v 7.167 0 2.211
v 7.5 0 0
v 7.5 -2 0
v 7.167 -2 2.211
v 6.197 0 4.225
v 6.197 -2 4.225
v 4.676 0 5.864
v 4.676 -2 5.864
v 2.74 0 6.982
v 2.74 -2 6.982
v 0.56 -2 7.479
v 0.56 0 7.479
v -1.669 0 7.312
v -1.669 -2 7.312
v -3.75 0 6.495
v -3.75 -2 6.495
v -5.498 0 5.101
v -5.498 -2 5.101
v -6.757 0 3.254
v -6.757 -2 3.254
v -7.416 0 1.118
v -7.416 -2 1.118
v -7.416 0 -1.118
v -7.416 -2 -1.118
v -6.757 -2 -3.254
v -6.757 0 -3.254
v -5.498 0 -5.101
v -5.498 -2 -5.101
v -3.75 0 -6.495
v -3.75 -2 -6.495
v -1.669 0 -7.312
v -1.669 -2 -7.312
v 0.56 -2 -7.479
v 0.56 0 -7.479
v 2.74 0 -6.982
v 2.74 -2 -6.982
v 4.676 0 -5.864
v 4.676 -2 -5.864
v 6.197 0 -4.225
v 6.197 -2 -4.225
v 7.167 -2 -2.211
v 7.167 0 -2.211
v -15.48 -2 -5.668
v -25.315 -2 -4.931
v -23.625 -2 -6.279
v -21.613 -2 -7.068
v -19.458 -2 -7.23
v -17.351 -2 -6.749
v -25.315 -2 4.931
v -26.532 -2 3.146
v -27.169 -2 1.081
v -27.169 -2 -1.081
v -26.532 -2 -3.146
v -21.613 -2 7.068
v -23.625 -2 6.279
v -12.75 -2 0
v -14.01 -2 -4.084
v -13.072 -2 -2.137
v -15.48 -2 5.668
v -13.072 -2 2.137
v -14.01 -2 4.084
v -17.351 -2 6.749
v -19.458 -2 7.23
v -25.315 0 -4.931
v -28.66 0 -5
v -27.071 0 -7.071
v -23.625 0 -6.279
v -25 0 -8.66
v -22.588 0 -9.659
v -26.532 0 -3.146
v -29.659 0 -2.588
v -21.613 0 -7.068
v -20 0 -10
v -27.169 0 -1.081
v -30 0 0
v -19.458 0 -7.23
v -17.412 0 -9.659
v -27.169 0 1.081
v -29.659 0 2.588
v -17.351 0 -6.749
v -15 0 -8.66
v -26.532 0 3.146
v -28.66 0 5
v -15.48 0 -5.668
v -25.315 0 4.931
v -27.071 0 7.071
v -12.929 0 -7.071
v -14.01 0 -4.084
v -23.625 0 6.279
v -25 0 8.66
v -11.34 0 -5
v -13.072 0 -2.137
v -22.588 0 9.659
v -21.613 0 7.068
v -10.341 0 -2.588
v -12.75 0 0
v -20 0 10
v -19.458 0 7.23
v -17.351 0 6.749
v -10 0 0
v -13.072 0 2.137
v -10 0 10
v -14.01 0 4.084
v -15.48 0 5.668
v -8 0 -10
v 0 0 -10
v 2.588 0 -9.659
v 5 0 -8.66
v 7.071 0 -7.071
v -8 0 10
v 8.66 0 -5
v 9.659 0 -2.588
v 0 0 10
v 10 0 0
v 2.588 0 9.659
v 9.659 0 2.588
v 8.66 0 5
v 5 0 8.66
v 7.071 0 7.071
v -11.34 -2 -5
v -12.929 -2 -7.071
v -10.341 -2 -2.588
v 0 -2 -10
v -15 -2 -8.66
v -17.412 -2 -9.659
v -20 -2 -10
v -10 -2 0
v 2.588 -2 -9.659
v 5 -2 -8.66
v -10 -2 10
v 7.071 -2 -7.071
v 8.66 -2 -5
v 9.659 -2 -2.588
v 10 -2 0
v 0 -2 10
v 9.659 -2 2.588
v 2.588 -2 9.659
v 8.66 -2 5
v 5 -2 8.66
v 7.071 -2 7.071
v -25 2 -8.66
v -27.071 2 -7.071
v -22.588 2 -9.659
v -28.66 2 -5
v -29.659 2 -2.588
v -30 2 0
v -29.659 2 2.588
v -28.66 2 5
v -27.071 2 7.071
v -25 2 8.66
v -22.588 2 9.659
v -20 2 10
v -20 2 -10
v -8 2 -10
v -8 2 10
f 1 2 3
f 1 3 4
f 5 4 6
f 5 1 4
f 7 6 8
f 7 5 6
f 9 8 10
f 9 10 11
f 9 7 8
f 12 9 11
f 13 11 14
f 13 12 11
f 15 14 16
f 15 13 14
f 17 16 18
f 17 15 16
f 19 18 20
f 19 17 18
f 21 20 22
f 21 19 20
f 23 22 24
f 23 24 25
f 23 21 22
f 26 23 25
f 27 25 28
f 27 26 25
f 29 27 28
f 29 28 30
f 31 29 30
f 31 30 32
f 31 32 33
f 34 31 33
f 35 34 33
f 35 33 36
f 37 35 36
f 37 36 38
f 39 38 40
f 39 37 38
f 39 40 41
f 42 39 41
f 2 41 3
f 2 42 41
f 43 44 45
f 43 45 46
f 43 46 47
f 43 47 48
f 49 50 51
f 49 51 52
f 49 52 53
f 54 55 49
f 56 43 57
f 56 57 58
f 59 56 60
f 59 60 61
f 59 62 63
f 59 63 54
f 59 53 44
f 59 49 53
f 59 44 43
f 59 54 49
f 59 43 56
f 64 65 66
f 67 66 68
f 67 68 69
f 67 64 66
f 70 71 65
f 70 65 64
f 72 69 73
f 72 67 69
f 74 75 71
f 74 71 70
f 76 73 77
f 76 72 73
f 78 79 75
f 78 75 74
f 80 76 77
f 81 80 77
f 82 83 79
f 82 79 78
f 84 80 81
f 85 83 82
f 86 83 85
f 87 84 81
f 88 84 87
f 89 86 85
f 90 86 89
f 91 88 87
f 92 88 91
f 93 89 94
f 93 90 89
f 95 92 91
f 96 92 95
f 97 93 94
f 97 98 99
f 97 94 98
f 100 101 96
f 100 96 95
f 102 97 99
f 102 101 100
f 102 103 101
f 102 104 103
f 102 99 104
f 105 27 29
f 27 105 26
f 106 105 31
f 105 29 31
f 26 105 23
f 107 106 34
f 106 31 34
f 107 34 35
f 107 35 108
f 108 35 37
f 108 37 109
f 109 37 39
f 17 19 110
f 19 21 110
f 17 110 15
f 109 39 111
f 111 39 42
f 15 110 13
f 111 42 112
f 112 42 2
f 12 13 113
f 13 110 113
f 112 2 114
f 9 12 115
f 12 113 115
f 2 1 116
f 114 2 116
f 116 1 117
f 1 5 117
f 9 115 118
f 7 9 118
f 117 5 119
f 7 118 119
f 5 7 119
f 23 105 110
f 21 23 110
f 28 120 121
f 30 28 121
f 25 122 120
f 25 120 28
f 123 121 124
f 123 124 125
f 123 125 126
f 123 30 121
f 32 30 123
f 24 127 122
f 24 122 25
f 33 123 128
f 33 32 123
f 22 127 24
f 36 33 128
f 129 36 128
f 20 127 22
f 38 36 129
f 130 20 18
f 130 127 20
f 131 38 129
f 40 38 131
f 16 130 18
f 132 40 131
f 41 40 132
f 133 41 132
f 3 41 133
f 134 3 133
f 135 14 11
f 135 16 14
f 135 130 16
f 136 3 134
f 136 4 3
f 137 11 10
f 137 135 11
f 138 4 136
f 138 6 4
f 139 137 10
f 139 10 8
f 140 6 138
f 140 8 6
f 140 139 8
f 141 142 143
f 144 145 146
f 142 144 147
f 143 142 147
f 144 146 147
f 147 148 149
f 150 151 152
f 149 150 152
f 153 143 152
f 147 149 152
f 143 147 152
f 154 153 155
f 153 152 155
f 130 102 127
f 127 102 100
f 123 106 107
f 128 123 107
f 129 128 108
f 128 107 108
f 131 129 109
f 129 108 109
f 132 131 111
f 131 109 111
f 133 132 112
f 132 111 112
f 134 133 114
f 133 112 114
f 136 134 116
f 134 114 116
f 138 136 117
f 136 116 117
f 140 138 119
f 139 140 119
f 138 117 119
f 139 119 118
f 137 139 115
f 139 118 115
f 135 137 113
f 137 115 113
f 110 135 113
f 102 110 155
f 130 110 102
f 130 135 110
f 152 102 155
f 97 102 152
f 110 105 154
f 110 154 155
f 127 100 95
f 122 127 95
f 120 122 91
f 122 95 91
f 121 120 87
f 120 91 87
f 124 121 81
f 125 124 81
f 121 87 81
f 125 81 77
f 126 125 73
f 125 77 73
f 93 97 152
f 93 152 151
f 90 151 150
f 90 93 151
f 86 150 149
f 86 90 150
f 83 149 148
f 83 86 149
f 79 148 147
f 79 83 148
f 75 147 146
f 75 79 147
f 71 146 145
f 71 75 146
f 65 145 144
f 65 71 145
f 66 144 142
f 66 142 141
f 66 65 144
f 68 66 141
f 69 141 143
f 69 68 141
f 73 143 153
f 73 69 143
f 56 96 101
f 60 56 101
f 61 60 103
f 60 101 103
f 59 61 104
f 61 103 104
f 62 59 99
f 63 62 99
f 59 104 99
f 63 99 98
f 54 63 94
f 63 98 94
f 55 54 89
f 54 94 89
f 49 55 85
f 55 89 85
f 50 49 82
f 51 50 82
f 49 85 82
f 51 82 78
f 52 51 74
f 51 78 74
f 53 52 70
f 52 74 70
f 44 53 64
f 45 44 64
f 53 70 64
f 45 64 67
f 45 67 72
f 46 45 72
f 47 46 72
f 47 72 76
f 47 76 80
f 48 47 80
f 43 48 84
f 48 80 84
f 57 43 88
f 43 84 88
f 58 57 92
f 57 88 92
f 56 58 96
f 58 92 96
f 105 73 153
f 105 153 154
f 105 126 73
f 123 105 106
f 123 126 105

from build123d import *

# Parameters (mm, degrees)
F0_R          = 7.5
F1_DEPTH      = 2
F0_R_2        = 7.25
F2_DEPTH      = 2
F3_DEPTH      = 2
F3_DEPTH_BACK = 2


with BuildPart() as f1:
    # F0 (on Front) → F1 (new body)
    with BuildSketch(Plane.XZ):
        with BuildLine():
            Line((-8, 10), (-8, -10))
            Line((-8, -10), (0, -10))
            ThreePointArc((0, -10), (10, 0), (0, 10))
            Line((0, 10), (-8, 10))
        make_face()
        Circle(F0_R, mode=Mode.SUBTRACT)
        with BuildLine():
            Line((-10, 10), (-10, 0))
            ThreePointArc((-10, 0), (-12.928932, -7.071068), (-20, -10))
            Line((-20, -10), (-8, -10))
            Line((-8, -10), (-8, 10))
            Line((-8, 10), (-10, 10))
        make_face()
    extrude(amount=F1_DEPTH)

    # F0 (on Front) → F2 (join)
    with BuildSketch(Plane.XZ):
        with BuildLine():
            Line((-10, 10), (-10, 0))
            ThreePointArc((-10, 0), (-12.928932, -7.071068), (-20, -10))
            Line((-20, -10), (-8, -10))
            Line((-8, -10), (-8, 10))
            Line((-8, 10), (-10, 10))
        make_face()
        with BuildLine():
            ThreePointArc((-20, -10), (-12.928932, -7.071068), (-10, 0))
            Line((-10, 0), (-10, 10))
            Line((-10, 10), (-20, 10))
            ThreePointArc((-20, 10), (-30, 0), (-20, -10))
        make_face()
        with Locations((-20, 0)):
            Circle(F0_R_2, mode=Mode.SUBTRACT)
    extrude(amount=-F2_DEPTH)

    # F0 (on Front) → F3 (join, two sides)
    with BuildSketch(Plane.XZ) as f3_sk:
        with Locations((-20, 0)):
            Circle(F0_R_2)
    extrude(amount=F3_DEPTH)
    extrude(f3_sk.sketch, amount=-F3_DEPTH_BACK)


solid = f1.part
